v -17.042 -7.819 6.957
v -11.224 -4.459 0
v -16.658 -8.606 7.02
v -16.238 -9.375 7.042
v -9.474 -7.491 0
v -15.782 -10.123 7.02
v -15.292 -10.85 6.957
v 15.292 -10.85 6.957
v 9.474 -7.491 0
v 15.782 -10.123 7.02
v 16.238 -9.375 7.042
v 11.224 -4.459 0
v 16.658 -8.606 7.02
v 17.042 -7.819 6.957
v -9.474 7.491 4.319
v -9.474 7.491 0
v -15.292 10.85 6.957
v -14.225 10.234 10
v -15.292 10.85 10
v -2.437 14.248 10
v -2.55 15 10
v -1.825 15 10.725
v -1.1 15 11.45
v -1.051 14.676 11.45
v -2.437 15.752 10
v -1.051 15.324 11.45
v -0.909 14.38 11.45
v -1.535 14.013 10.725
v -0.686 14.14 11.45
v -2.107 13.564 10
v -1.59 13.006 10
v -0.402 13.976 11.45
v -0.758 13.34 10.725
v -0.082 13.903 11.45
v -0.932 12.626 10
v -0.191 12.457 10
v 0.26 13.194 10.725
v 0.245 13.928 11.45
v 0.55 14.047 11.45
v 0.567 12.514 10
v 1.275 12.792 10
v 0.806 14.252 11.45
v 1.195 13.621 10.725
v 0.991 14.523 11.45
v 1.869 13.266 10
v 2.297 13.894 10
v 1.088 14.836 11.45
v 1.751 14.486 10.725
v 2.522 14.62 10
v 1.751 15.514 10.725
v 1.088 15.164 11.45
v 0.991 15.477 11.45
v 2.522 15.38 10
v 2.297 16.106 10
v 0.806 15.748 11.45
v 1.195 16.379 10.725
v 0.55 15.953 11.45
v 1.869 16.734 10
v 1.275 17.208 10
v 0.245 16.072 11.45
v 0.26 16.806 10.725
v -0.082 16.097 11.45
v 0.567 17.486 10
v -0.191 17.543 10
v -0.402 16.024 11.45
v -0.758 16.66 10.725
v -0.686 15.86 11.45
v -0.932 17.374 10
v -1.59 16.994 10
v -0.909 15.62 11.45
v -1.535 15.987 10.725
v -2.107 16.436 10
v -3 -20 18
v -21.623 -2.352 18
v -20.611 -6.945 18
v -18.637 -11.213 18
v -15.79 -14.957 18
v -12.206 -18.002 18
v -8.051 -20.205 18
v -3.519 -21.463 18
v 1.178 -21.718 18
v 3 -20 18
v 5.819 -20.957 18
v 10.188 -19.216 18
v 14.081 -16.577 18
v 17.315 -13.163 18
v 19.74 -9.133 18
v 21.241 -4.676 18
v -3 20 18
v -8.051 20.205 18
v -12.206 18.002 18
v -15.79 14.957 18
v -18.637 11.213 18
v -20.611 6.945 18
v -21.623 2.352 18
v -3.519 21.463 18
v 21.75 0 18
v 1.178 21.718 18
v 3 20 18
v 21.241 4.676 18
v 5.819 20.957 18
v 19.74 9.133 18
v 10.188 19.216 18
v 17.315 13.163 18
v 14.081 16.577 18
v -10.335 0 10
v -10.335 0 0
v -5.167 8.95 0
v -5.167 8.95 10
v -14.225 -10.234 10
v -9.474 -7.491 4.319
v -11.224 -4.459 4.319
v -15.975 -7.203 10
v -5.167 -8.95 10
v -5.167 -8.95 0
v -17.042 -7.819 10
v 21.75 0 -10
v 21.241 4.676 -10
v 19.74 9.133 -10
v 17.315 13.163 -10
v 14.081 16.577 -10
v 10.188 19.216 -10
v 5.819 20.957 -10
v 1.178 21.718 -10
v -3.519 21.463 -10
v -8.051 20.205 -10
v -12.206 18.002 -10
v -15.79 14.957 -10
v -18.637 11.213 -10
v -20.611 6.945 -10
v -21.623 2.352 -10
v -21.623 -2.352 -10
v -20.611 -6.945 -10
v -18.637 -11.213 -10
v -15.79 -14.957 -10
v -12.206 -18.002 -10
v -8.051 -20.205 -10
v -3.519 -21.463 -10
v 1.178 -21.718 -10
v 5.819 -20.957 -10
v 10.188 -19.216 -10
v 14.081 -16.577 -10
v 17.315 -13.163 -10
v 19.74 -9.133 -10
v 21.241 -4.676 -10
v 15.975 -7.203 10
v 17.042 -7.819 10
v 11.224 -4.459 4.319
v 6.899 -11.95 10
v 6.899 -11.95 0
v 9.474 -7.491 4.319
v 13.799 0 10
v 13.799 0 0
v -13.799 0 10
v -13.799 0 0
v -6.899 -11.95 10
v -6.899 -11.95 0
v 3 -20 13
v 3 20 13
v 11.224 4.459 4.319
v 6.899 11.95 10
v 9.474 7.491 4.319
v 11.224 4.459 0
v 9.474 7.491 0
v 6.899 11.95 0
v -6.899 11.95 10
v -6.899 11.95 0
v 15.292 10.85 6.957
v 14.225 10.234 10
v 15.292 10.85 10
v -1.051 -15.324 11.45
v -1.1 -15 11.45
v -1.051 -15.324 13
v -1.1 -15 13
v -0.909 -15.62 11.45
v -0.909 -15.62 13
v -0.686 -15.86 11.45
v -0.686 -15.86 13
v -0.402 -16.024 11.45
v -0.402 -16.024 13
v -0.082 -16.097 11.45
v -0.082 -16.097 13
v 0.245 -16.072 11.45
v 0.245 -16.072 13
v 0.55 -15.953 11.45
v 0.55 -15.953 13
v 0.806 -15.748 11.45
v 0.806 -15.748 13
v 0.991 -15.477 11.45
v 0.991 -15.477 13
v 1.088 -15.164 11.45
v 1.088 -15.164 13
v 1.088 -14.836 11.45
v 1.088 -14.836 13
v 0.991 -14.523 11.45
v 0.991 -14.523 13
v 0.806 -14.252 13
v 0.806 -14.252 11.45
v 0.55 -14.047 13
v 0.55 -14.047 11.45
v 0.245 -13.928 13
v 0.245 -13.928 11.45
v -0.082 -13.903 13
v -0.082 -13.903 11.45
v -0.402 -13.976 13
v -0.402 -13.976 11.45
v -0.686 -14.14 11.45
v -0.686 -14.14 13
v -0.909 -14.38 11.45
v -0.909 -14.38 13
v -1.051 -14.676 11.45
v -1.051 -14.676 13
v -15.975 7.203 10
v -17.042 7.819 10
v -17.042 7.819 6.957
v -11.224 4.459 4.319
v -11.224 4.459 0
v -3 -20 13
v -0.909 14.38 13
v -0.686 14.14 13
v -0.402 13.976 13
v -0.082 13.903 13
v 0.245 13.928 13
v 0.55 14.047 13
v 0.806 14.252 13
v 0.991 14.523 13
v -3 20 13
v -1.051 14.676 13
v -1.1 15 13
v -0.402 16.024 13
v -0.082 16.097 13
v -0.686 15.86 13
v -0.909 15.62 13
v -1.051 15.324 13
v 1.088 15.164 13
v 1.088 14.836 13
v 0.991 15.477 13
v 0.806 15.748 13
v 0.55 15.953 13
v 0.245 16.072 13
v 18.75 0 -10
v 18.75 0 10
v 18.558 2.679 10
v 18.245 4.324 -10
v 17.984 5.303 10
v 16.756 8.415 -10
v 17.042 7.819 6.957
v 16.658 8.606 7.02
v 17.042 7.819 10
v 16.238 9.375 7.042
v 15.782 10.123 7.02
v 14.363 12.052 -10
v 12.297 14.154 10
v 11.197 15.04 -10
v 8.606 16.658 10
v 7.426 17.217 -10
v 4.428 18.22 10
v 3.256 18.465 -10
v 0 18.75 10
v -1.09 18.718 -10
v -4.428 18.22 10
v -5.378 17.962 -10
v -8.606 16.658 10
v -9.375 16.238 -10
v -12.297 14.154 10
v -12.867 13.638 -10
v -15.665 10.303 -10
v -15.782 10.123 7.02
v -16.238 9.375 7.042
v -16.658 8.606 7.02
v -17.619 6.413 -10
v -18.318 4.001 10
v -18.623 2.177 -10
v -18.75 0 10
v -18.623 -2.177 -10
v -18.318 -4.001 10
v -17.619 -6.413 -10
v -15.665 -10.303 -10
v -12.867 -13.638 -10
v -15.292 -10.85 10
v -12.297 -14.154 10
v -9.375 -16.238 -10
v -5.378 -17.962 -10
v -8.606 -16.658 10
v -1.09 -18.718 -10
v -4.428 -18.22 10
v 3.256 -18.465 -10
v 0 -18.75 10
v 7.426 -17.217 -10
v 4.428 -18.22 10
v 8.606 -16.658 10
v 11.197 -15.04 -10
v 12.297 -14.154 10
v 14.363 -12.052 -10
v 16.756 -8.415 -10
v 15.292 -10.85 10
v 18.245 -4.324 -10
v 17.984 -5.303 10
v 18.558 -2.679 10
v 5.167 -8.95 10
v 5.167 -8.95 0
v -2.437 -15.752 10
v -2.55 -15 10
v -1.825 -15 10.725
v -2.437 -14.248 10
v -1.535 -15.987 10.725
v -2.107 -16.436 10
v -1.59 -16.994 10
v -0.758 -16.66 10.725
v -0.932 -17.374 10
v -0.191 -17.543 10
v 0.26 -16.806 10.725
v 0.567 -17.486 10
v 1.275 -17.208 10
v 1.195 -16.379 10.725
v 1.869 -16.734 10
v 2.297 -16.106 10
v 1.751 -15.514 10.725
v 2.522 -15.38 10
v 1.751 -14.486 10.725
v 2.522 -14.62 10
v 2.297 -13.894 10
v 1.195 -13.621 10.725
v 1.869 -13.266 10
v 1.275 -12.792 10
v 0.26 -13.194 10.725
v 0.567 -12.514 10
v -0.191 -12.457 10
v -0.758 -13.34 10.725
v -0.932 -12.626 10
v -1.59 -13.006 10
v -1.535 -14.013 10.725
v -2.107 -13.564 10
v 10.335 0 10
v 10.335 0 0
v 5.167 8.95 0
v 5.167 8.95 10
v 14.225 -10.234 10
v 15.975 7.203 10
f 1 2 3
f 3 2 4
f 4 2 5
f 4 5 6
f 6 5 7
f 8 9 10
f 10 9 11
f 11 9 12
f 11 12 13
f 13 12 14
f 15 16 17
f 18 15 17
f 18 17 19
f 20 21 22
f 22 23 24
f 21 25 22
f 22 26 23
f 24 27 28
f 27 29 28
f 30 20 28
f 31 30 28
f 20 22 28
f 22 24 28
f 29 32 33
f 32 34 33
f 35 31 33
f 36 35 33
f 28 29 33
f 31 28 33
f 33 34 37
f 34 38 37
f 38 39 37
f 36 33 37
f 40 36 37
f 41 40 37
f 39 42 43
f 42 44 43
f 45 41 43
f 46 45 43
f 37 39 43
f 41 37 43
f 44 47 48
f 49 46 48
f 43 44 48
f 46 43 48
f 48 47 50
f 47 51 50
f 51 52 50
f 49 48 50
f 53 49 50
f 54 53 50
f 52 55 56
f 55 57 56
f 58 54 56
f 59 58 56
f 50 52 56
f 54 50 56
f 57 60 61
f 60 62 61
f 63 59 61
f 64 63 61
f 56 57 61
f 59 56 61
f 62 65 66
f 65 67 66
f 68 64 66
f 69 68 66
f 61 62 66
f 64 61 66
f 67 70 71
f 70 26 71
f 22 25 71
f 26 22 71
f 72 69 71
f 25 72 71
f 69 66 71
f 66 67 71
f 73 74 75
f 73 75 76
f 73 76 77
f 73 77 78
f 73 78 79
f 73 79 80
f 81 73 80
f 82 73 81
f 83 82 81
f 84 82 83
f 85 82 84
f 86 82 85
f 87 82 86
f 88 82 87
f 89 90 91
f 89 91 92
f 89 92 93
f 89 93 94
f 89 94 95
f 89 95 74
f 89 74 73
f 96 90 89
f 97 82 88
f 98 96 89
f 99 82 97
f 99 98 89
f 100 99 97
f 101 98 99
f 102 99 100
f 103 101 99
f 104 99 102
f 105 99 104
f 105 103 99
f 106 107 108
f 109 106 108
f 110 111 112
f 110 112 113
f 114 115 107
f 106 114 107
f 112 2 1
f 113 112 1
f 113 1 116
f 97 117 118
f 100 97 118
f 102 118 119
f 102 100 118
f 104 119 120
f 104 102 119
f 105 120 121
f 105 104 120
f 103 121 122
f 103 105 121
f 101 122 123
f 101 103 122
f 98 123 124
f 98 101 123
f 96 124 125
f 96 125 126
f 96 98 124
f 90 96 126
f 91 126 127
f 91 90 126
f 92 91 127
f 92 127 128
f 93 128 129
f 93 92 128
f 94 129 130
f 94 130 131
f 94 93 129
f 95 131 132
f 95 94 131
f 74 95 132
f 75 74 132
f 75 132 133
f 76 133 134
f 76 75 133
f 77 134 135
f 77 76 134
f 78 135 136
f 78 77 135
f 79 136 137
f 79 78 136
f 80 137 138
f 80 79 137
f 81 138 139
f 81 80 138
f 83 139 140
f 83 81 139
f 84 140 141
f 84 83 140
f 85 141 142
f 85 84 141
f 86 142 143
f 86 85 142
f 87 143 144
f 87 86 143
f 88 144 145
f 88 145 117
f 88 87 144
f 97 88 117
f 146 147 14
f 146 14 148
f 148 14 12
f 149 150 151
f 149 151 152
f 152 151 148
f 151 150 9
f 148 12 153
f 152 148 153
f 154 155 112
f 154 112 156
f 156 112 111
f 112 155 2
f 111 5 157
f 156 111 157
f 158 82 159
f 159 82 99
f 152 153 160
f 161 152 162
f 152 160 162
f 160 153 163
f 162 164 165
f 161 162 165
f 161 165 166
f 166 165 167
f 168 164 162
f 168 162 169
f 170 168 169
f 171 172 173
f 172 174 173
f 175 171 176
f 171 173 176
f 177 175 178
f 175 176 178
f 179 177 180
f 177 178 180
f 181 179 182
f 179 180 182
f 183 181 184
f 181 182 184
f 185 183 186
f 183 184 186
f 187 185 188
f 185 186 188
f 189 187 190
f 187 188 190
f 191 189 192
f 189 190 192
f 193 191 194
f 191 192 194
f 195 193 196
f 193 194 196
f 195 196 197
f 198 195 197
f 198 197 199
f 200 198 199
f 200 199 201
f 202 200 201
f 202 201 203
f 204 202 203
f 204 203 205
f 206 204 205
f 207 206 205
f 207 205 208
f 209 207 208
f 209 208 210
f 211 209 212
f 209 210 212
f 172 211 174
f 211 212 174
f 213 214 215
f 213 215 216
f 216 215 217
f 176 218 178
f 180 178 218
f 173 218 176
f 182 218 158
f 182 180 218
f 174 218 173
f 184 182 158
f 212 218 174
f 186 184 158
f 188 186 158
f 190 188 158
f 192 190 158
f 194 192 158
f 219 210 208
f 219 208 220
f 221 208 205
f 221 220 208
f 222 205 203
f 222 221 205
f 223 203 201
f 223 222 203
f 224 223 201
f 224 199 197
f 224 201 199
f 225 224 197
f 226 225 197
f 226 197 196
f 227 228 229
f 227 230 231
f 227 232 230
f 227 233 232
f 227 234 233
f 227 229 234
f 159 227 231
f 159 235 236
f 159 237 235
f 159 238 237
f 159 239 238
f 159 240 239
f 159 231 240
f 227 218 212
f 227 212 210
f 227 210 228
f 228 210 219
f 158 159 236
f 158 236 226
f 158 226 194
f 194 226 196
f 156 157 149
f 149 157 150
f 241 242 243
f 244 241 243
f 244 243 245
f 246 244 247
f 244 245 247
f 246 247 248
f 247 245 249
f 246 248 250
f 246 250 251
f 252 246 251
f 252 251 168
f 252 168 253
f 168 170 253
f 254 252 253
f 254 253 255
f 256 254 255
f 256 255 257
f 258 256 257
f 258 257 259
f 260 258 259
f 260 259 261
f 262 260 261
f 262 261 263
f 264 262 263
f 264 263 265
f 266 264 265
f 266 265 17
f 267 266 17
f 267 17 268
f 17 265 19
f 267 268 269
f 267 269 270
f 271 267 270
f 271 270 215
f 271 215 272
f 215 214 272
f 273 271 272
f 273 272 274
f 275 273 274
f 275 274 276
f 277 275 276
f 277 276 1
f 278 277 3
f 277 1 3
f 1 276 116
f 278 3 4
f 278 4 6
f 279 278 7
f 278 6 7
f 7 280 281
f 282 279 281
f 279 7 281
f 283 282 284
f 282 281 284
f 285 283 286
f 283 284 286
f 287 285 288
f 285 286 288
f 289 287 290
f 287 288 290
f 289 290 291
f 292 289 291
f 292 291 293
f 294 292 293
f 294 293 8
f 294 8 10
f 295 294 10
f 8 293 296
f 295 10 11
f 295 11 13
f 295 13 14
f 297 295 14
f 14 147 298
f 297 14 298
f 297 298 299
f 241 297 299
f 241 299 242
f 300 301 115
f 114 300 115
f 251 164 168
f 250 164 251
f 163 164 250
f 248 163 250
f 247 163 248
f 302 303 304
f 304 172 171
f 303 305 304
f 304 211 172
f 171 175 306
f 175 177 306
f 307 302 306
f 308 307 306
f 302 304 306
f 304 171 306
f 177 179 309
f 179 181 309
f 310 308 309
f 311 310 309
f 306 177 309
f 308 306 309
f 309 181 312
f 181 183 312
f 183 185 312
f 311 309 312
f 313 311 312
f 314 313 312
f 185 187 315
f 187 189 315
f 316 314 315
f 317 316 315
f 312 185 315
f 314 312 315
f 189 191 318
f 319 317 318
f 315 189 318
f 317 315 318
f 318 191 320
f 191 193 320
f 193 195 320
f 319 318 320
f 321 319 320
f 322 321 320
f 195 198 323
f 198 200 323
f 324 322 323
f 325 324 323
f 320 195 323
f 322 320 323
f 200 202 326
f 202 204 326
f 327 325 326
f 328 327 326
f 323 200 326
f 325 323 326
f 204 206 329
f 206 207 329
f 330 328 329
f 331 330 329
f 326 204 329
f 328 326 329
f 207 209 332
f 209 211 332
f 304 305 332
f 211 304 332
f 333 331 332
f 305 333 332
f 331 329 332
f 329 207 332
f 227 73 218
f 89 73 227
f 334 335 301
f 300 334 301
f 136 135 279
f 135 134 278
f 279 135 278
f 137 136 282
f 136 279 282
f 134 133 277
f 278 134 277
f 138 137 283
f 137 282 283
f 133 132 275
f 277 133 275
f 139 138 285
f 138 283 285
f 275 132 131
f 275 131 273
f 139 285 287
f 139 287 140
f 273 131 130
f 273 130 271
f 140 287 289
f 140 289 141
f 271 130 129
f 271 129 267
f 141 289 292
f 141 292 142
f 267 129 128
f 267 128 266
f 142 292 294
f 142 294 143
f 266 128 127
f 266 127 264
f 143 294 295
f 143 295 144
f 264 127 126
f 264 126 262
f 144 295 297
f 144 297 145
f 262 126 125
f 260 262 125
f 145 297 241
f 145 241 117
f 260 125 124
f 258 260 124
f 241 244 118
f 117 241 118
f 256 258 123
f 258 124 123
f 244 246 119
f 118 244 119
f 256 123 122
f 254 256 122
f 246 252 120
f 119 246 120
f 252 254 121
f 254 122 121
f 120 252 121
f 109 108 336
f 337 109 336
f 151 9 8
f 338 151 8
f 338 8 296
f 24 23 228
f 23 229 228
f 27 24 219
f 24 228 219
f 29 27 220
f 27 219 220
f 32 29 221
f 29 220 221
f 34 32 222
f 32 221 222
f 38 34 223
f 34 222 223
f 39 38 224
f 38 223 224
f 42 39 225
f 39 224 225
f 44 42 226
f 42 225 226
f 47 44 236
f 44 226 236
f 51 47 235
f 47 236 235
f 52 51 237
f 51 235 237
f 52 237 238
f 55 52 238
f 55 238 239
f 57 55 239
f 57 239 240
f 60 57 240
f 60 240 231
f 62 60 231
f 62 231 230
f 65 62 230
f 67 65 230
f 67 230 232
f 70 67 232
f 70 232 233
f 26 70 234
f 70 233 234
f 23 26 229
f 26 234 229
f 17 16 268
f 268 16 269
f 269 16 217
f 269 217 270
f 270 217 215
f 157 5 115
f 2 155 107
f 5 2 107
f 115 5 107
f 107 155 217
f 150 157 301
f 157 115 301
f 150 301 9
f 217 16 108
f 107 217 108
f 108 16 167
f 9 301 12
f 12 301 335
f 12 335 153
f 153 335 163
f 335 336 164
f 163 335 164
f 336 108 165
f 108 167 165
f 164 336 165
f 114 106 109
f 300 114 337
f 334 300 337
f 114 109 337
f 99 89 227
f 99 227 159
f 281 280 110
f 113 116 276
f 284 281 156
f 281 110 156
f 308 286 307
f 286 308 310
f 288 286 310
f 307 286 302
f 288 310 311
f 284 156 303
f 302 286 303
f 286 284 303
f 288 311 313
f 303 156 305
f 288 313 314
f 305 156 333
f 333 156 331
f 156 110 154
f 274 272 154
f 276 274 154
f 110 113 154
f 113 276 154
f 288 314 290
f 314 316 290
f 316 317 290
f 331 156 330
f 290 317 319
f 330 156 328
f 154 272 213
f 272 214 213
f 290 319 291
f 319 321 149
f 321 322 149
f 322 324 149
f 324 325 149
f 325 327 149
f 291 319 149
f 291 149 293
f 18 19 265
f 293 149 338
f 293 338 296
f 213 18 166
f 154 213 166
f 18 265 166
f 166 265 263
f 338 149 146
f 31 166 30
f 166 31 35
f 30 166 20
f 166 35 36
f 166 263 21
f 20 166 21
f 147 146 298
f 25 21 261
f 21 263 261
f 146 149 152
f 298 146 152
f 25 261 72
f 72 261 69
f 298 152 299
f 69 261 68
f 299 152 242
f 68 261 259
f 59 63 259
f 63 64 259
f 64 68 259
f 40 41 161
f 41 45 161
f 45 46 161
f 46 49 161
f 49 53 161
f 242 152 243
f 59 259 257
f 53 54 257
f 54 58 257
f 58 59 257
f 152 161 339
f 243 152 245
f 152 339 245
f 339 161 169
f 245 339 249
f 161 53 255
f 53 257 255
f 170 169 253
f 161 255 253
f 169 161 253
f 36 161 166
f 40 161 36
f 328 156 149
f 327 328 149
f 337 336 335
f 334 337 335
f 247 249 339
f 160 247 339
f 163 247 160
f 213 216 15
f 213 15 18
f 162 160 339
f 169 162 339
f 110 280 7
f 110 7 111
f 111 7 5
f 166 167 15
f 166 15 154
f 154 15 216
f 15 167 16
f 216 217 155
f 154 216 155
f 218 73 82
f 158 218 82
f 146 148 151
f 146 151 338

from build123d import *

# Parameters (mm, degrees)
F1_DEPTH        = 10
F2_R            = 21.75
F2_R_2          = 18.75
F3_DEPTH        = 20
F4_DEPTH        = 8
F7_DEPTH        = 3
F8_W            = 6
F8_H            = 40
F9_DEPTH        = 5
F11_D           = 2.2
F11_CSINK_D     = 5.1
F11_CSINK_ANGLE = 90


# Not quite as in the source:
# - a pattern or mirror of a feature is missing from the dataset's text; its kind, count and spacing are read off the source's solid


with BuildPart() as f1:
    # F0 (on Top) → F1 (new body)
    with BuildSketch(Plane.XY):
        Polygon((6.8993357168, 11.95), (-6.8993357168, 11.95), (-13.7986714336, 0), (-6.8993357168, -11.95), (6.8993357168, -11.95), (13.7986714336, 0), align=None)
        Polygon((-10.3345698185, 0), (-5.1672849092, 8.95), (5.1672849092, 8.95), (10.3345698185, 0), (5.1672849092, -8.95), (-5.1672849092, -8.95), align=None, mode=Mode.SUBTRACT)
    extrude(amount=F1_DEPTH)



with BuildPart() as f3:
    # F2 (on face) → F3 (new body)
    with BuildSketch(Plane.XY.offset(10)):
        Circle(F2_R)
        Circle(F2_R_2, mode=Mode.SUBTRACT)
    extrude(amount=-F3_DEPTH)


with BuildPart() as f4:
    # F2 (on face) → F4 (new body)
    with BuildSketch(Plane.XY.offset(10)):
        Circle(F2_R)
        Circle(F2_R_2, mode=Mode.SUBTRACT)
        Circle(F2_R_2)
        Polygon((6.8993357168, 11.95), (13.7986714336, 0), (6.8993357168, -11.95), (-6.8993357168, -11.95), (-13.7986714336, 0), (-6.8993357168, 11.95), align=None, mode=Mode.SUBTRACT)
        Polygon((6.8993357168, -11.95), (13.7986714336, 0), (6.8993357168, 11.95), (-6.8993357168, 11.95), (-13.7986714336, 0), (-6.8993357168, -11.95), align=None)
        Polygon((5.1672849092, -8.95), (-5.1672849092, -8.95), (-10.3345698185, 0), (-5.1672849092, 8.95), (5.1672849092, 8.95), (10.3345698185, 0), align=None, mode=Mode.SUBTRACT)
        Polygon((-10.3345698185, 0), (-5.1672849092, -8.95), (5.1672849092, -8.95), (10.3345698185, 0), (5.1672849092, 8.95), (-5.1672849092, 8.95), align=None)
    extrude(amount=F4_DEPTH)


with BuildPart() as f1_1:
    add(f1.part)

    add(f3.part)  # F7 merges F3

    add(f4.part)  # F7 merges F4
    # F6 (on face) → F7 (join)
    with BuildSketch(Plane(origin=(5.3550892957, 3.0917622464, -5.9713601914), x_dir=(0.7822484827, -0.2864336826, 0.5532115841), z_dir=(0.622966541, 0.3596699002, -0.6946583705))):
        Polygon((7.5026214932, -3.9601203317), (5.2654806886, -6.6518114397), (15.9953805493, -15.5697354674), (18.2325213539, -12.8780443594), align=None)
    f7 = extrude(amount=-F7_DEPTH)

    # F7_copies: F7 across plane
    add(f7.mirror(Plane(origin=(0, 0, 0), x_dir=(0, 0, -1), z_dir=(0, -1, 0))))

    # F7_copies1: F7 across plane
    add(f7.mirror(Plane(origin=(0, 0, 0), x_dir=(0, 0, -1), z_dir=(-1, 0, 0))))

    # F7_copies2: F7 across plane
    add(f7.mirror(Plane(origin=(0, 0, 0), x_dir=(0.5, -0.8660254038, 0), z_dir=(-0.8660254038, -0.5, 0))))

    # F8 (on face) → F9 (cut)
    with BuildSketch(Plane.XY.offset(18)):
        Rectangle(F8_W, F8_H)
    extrude(amount=-F9_DEPTH, mode=Mode.SUBTRACT)

    # F11 (through all)
    with Locations(Plane(origin=(0, 0, 10), x_dir=(1, 0, 0), z_dir=(0, 0, -1))):
        with Locations((0, 15), (0, -15)):
            CounterSinkHole(F11_D / 2, F11_CSINK_D / 2, counter_sink_angle=F11_CSINK_ANGLE)


solid = f1_1.part
